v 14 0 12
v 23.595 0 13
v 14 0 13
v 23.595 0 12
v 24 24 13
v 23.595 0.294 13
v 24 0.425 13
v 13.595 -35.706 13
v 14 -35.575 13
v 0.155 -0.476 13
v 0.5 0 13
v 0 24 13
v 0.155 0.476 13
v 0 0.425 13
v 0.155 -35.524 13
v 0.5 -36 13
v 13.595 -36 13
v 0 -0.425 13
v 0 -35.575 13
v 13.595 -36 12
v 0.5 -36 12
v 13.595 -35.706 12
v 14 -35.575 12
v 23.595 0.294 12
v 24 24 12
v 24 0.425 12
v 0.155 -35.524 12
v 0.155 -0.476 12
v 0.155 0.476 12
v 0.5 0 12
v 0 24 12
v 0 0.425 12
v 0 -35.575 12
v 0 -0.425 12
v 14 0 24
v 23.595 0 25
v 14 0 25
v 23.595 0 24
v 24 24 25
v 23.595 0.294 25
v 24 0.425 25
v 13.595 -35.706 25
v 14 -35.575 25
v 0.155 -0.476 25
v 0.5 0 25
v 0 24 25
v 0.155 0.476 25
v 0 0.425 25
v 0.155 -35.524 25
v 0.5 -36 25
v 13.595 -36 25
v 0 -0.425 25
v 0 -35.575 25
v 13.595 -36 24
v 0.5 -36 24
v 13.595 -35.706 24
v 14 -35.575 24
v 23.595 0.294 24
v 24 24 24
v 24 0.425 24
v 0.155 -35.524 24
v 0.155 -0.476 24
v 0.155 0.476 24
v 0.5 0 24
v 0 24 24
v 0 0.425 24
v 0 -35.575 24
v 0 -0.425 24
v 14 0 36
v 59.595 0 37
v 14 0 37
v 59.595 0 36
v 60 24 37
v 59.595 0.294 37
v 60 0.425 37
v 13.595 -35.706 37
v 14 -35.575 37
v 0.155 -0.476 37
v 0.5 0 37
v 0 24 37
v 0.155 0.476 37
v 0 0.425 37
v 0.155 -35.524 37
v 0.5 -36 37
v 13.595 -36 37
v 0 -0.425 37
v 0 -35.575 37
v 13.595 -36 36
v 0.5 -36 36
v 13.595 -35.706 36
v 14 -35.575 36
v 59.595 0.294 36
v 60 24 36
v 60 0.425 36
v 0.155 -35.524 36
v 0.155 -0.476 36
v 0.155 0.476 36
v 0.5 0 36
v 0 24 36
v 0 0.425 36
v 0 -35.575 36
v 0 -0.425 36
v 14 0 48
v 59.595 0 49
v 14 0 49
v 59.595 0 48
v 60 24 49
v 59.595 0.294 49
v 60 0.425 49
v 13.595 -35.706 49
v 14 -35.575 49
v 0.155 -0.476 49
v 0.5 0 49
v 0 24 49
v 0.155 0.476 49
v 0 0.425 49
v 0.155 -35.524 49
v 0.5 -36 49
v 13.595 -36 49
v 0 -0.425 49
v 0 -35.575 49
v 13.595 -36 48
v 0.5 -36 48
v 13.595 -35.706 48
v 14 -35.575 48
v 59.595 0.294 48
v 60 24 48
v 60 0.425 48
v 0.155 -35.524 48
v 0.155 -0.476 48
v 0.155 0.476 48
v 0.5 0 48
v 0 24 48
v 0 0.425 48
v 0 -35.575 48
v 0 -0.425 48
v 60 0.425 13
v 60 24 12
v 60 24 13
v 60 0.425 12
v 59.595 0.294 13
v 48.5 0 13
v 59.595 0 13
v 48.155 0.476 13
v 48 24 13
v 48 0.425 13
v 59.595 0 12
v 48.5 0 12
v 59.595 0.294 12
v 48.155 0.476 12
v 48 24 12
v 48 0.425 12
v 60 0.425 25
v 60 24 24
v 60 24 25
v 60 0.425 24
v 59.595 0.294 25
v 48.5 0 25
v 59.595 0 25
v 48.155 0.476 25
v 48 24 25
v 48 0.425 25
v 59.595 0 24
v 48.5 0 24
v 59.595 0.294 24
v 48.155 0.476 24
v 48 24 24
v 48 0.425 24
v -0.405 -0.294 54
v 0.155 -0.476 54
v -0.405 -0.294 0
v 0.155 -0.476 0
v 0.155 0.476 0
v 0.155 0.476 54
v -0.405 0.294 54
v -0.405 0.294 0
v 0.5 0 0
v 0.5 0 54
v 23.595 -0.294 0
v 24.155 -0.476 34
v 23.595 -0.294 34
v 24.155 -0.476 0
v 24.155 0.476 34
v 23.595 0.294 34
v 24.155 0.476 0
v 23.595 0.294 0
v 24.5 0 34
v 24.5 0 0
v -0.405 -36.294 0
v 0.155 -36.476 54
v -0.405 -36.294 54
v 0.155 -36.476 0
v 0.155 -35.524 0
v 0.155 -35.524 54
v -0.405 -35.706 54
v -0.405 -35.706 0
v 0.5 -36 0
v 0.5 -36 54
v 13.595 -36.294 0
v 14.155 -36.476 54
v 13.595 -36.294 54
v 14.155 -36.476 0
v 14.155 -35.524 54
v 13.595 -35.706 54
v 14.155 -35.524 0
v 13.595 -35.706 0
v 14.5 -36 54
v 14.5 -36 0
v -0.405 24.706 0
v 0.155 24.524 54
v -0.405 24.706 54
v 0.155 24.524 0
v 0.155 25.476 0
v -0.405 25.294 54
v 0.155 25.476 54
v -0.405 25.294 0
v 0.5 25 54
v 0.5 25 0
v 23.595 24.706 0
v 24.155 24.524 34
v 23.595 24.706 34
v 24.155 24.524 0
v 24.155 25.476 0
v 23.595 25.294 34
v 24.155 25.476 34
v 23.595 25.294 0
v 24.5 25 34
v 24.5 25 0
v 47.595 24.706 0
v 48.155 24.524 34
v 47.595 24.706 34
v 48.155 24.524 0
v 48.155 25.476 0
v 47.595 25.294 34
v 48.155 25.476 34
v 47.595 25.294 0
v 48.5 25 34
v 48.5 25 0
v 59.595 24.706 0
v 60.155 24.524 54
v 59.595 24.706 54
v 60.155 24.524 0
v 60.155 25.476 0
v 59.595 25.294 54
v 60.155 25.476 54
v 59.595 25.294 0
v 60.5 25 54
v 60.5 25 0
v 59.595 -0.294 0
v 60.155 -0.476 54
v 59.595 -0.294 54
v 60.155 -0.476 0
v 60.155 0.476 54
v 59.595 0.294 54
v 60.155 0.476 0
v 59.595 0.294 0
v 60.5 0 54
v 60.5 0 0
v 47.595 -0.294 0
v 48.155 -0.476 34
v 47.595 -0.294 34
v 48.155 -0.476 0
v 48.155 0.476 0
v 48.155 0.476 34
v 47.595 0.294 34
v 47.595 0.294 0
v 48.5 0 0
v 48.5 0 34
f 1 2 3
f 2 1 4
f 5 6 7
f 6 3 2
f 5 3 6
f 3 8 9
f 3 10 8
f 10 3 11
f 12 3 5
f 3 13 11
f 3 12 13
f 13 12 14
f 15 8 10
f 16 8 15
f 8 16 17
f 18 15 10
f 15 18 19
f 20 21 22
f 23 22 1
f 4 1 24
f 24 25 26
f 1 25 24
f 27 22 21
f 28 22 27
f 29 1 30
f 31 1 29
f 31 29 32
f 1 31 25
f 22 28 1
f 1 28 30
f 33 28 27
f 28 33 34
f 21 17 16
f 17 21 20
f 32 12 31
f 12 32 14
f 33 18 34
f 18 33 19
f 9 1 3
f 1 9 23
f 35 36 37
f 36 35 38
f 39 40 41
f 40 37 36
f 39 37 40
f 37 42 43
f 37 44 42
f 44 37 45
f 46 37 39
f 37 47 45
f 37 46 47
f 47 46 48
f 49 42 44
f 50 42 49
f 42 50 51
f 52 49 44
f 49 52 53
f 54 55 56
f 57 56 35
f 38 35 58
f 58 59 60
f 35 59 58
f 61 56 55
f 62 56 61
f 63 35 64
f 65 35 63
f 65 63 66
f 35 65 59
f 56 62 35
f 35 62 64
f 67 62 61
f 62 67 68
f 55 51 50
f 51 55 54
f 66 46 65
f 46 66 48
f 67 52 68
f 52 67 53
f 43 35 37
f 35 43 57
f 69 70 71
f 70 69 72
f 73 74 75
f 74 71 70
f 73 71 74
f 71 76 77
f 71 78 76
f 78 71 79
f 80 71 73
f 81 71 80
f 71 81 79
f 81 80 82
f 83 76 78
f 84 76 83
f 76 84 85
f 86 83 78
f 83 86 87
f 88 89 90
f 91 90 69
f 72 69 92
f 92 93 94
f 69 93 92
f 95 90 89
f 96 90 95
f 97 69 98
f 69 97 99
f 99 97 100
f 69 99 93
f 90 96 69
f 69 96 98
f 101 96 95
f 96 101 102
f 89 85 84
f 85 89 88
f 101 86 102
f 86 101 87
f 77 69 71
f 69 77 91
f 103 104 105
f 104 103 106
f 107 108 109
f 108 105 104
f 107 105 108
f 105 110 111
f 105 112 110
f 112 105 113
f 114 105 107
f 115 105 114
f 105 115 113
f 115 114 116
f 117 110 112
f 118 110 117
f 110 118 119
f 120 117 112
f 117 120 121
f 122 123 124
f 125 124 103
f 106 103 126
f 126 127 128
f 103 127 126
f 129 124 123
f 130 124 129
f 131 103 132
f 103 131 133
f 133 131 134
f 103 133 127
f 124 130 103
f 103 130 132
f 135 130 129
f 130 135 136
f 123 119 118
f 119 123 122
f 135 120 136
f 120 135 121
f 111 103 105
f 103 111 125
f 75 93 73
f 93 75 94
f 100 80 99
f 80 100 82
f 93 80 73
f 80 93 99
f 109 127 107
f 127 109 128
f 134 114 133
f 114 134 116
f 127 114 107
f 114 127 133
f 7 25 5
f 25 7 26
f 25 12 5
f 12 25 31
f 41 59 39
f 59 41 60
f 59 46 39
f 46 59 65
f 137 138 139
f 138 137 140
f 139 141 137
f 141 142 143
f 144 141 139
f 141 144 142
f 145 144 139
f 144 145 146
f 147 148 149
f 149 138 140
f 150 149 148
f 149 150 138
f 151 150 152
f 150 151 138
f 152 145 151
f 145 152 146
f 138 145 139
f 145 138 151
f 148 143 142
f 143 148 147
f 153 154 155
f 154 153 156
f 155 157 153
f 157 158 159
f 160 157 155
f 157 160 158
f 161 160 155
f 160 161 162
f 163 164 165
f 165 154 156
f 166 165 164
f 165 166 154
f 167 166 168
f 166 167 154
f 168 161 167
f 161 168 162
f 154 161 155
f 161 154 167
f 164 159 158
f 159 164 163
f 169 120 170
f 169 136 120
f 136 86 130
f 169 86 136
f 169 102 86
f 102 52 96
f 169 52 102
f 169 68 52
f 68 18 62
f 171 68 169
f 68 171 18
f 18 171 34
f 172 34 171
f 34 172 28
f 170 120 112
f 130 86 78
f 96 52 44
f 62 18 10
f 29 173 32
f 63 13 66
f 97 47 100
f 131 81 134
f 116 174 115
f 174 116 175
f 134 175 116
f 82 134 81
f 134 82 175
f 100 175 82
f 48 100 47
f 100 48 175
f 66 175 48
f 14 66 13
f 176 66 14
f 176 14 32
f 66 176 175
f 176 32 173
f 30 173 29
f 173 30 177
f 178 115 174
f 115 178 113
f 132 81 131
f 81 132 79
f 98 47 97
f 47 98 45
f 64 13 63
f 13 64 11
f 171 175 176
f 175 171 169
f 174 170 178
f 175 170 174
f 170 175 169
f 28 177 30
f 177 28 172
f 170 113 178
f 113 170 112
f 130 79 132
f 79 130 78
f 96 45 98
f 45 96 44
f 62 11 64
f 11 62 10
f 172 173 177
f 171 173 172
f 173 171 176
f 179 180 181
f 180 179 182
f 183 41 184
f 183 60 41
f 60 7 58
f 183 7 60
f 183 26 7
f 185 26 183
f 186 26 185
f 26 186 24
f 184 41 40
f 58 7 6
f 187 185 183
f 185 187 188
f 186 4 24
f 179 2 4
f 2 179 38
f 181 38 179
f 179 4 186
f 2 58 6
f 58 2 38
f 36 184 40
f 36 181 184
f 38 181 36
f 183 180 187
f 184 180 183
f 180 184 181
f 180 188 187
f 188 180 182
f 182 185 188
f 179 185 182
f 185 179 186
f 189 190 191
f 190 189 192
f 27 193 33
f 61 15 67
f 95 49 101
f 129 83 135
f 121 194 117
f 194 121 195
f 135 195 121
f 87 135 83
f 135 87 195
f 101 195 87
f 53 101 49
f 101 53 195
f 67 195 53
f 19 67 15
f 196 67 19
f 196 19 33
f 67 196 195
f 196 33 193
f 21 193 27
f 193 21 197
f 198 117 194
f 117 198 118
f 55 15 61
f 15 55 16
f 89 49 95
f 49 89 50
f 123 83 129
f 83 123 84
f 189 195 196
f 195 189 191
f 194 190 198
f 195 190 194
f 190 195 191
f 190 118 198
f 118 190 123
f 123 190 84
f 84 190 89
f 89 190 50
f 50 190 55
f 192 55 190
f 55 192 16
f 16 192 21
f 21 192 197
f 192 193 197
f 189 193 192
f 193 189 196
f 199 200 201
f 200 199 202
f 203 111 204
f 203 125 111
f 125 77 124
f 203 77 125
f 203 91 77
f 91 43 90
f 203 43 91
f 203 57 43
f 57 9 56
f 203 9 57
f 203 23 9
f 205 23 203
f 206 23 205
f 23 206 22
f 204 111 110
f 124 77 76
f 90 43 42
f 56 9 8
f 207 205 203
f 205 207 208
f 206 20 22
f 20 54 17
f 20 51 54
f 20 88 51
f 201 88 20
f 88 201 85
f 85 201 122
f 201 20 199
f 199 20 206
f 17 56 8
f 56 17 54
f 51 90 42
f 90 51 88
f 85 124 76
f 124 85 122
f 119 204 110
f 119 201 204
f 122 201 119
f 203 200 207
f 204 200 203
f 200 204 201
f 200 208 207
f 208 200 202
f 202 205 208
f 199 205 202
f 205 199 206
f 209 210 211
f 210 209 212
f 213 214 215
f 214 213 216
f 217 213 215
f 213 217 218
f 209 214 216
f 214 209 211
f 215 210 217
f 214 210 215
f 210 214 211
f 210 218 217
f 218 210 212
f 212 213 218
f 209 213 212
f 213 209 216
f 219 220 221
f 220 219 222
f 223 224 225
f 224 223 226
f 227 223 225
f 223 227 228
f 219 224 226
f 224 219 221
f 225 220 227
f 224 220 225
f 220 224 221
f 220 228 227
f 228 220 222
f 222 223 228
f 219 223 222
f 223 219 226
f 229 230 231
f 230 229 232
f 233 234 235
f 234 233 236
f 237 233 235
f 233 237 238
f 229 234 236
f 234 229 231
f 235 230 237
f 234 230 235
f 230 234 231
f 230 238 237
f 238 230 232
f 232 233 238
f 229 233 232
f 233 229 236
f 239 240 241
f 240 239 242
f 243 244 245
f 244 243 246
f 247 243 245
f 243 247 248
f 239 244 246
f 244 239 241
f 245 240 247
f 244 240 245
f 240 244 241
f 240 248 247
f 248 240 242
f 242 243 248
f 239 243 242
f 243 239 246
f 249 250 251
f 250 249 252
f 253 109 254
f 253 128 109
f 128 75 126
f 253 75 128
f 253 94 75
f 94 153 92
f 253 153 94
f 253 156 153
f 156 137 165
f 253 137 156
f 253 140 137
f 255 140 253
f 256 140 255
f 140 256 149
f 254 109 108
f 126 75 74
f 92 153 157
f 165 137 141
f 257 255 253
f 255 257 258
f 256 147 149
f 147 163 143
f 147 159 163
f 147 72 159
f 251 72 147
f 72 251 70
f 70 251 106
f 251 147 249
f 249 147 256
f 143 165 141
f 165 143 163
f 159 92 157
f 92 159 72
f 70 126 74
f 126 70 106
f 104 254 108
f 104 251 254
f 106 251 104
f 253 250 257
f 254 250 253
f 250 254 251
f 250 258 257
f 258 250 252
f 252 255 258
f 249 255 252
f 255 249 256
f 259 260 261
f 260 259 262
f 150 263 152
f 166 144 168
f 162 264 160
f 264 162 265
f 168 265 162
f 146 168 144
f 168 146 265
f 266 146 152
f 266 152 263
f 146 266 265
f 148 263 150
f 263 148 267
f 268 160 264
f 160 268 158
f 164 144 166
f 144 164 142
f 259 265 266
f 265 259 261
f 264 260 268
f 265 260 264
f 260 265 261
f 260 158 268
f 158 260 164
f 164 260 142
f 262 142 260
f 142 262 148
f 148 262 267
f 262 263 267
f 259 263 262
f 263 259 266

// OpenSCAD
front_width = 62;
front_depth = 25;
side_width = 14;
side_depth = 36;
space_height = 61;

module space() {
    color("blue", 0.1) {
        cube([front_width, front_depth, space_height]);
        translate([0, -side_depth, 0])
        cube([side_width, side_depth, space_height]);
    }
}
//space();

side_shelf_width = 36;
side_shelf_depth = 14;

module side_shelf() {
    cube([side_shelf_width, side_shelf_depth, 1]);
}

shelf_gap = 12;

module side_shelves() {
    rotate([0, 0, 90])
    translate([-side_shelf_width, -side_shelf_depth, 0])
    for(i = [shelf_gap : shelf_gap : shelf_gap * 4]) {
        translate([0, 0, i])
        side_shelf();
    }

}

color("gray", 1)
side_shelves();

module front_shelf(width, depth) {
    cube([width, depth, 1]);
}

module front_shelves(width, depth) {
    for(i = [3*shelf_gap : shelf_gap : 4*shelf_gap]) {
        translate([0, 0, i])
        front_shelf(width, depth);
    }
}

front_shelf_width = 60;


color("orange", 1) front_shelves(front_shelf_width, 24);

translate([0, 0, shelf_gap]) front_shelf(24, 24);
translate([0, 0, shelf_gap*2]) front_shelf(24, 24);

translate([ front_shelf_width - 12, 0, shelf_gap ]) front_shelf(12, 24);
translate([ front_shelf_width - 12, 0, shelf_gap*2 ]) front_shelf(12, 24);
    
 
 module workspace() {
     translate([side_width+10, 0, 0])
     color("blue", .2) cube([24, front_depth, 33]);
 }
 
//workspace();


module post(h = 54) {
    cylinder(h =h, r = .5, center = false);
}

color("gray") post();
color("green", .5) translate([24, 0, 0]) post(34);
color("gray", 1) translate([0, -side_depth, 0]) post();
color("gray", 1) translate([side_width, -side_depth, 0]) post();
color("gray") translate([0, front_depth, 0]) post();
color("green", .5) translate([24, front_depth, 0]) post(34);
color("green", .5) translate([front_shelf_width-12, front_depth, 0]) post(34);
translate([front_shelf_width, front_depth, 0]) post();
translate([front_shelf_width, 0, 0]) post();
color("green", .5)translate([front_shelf_width-12, 0, 0]) post(34);
